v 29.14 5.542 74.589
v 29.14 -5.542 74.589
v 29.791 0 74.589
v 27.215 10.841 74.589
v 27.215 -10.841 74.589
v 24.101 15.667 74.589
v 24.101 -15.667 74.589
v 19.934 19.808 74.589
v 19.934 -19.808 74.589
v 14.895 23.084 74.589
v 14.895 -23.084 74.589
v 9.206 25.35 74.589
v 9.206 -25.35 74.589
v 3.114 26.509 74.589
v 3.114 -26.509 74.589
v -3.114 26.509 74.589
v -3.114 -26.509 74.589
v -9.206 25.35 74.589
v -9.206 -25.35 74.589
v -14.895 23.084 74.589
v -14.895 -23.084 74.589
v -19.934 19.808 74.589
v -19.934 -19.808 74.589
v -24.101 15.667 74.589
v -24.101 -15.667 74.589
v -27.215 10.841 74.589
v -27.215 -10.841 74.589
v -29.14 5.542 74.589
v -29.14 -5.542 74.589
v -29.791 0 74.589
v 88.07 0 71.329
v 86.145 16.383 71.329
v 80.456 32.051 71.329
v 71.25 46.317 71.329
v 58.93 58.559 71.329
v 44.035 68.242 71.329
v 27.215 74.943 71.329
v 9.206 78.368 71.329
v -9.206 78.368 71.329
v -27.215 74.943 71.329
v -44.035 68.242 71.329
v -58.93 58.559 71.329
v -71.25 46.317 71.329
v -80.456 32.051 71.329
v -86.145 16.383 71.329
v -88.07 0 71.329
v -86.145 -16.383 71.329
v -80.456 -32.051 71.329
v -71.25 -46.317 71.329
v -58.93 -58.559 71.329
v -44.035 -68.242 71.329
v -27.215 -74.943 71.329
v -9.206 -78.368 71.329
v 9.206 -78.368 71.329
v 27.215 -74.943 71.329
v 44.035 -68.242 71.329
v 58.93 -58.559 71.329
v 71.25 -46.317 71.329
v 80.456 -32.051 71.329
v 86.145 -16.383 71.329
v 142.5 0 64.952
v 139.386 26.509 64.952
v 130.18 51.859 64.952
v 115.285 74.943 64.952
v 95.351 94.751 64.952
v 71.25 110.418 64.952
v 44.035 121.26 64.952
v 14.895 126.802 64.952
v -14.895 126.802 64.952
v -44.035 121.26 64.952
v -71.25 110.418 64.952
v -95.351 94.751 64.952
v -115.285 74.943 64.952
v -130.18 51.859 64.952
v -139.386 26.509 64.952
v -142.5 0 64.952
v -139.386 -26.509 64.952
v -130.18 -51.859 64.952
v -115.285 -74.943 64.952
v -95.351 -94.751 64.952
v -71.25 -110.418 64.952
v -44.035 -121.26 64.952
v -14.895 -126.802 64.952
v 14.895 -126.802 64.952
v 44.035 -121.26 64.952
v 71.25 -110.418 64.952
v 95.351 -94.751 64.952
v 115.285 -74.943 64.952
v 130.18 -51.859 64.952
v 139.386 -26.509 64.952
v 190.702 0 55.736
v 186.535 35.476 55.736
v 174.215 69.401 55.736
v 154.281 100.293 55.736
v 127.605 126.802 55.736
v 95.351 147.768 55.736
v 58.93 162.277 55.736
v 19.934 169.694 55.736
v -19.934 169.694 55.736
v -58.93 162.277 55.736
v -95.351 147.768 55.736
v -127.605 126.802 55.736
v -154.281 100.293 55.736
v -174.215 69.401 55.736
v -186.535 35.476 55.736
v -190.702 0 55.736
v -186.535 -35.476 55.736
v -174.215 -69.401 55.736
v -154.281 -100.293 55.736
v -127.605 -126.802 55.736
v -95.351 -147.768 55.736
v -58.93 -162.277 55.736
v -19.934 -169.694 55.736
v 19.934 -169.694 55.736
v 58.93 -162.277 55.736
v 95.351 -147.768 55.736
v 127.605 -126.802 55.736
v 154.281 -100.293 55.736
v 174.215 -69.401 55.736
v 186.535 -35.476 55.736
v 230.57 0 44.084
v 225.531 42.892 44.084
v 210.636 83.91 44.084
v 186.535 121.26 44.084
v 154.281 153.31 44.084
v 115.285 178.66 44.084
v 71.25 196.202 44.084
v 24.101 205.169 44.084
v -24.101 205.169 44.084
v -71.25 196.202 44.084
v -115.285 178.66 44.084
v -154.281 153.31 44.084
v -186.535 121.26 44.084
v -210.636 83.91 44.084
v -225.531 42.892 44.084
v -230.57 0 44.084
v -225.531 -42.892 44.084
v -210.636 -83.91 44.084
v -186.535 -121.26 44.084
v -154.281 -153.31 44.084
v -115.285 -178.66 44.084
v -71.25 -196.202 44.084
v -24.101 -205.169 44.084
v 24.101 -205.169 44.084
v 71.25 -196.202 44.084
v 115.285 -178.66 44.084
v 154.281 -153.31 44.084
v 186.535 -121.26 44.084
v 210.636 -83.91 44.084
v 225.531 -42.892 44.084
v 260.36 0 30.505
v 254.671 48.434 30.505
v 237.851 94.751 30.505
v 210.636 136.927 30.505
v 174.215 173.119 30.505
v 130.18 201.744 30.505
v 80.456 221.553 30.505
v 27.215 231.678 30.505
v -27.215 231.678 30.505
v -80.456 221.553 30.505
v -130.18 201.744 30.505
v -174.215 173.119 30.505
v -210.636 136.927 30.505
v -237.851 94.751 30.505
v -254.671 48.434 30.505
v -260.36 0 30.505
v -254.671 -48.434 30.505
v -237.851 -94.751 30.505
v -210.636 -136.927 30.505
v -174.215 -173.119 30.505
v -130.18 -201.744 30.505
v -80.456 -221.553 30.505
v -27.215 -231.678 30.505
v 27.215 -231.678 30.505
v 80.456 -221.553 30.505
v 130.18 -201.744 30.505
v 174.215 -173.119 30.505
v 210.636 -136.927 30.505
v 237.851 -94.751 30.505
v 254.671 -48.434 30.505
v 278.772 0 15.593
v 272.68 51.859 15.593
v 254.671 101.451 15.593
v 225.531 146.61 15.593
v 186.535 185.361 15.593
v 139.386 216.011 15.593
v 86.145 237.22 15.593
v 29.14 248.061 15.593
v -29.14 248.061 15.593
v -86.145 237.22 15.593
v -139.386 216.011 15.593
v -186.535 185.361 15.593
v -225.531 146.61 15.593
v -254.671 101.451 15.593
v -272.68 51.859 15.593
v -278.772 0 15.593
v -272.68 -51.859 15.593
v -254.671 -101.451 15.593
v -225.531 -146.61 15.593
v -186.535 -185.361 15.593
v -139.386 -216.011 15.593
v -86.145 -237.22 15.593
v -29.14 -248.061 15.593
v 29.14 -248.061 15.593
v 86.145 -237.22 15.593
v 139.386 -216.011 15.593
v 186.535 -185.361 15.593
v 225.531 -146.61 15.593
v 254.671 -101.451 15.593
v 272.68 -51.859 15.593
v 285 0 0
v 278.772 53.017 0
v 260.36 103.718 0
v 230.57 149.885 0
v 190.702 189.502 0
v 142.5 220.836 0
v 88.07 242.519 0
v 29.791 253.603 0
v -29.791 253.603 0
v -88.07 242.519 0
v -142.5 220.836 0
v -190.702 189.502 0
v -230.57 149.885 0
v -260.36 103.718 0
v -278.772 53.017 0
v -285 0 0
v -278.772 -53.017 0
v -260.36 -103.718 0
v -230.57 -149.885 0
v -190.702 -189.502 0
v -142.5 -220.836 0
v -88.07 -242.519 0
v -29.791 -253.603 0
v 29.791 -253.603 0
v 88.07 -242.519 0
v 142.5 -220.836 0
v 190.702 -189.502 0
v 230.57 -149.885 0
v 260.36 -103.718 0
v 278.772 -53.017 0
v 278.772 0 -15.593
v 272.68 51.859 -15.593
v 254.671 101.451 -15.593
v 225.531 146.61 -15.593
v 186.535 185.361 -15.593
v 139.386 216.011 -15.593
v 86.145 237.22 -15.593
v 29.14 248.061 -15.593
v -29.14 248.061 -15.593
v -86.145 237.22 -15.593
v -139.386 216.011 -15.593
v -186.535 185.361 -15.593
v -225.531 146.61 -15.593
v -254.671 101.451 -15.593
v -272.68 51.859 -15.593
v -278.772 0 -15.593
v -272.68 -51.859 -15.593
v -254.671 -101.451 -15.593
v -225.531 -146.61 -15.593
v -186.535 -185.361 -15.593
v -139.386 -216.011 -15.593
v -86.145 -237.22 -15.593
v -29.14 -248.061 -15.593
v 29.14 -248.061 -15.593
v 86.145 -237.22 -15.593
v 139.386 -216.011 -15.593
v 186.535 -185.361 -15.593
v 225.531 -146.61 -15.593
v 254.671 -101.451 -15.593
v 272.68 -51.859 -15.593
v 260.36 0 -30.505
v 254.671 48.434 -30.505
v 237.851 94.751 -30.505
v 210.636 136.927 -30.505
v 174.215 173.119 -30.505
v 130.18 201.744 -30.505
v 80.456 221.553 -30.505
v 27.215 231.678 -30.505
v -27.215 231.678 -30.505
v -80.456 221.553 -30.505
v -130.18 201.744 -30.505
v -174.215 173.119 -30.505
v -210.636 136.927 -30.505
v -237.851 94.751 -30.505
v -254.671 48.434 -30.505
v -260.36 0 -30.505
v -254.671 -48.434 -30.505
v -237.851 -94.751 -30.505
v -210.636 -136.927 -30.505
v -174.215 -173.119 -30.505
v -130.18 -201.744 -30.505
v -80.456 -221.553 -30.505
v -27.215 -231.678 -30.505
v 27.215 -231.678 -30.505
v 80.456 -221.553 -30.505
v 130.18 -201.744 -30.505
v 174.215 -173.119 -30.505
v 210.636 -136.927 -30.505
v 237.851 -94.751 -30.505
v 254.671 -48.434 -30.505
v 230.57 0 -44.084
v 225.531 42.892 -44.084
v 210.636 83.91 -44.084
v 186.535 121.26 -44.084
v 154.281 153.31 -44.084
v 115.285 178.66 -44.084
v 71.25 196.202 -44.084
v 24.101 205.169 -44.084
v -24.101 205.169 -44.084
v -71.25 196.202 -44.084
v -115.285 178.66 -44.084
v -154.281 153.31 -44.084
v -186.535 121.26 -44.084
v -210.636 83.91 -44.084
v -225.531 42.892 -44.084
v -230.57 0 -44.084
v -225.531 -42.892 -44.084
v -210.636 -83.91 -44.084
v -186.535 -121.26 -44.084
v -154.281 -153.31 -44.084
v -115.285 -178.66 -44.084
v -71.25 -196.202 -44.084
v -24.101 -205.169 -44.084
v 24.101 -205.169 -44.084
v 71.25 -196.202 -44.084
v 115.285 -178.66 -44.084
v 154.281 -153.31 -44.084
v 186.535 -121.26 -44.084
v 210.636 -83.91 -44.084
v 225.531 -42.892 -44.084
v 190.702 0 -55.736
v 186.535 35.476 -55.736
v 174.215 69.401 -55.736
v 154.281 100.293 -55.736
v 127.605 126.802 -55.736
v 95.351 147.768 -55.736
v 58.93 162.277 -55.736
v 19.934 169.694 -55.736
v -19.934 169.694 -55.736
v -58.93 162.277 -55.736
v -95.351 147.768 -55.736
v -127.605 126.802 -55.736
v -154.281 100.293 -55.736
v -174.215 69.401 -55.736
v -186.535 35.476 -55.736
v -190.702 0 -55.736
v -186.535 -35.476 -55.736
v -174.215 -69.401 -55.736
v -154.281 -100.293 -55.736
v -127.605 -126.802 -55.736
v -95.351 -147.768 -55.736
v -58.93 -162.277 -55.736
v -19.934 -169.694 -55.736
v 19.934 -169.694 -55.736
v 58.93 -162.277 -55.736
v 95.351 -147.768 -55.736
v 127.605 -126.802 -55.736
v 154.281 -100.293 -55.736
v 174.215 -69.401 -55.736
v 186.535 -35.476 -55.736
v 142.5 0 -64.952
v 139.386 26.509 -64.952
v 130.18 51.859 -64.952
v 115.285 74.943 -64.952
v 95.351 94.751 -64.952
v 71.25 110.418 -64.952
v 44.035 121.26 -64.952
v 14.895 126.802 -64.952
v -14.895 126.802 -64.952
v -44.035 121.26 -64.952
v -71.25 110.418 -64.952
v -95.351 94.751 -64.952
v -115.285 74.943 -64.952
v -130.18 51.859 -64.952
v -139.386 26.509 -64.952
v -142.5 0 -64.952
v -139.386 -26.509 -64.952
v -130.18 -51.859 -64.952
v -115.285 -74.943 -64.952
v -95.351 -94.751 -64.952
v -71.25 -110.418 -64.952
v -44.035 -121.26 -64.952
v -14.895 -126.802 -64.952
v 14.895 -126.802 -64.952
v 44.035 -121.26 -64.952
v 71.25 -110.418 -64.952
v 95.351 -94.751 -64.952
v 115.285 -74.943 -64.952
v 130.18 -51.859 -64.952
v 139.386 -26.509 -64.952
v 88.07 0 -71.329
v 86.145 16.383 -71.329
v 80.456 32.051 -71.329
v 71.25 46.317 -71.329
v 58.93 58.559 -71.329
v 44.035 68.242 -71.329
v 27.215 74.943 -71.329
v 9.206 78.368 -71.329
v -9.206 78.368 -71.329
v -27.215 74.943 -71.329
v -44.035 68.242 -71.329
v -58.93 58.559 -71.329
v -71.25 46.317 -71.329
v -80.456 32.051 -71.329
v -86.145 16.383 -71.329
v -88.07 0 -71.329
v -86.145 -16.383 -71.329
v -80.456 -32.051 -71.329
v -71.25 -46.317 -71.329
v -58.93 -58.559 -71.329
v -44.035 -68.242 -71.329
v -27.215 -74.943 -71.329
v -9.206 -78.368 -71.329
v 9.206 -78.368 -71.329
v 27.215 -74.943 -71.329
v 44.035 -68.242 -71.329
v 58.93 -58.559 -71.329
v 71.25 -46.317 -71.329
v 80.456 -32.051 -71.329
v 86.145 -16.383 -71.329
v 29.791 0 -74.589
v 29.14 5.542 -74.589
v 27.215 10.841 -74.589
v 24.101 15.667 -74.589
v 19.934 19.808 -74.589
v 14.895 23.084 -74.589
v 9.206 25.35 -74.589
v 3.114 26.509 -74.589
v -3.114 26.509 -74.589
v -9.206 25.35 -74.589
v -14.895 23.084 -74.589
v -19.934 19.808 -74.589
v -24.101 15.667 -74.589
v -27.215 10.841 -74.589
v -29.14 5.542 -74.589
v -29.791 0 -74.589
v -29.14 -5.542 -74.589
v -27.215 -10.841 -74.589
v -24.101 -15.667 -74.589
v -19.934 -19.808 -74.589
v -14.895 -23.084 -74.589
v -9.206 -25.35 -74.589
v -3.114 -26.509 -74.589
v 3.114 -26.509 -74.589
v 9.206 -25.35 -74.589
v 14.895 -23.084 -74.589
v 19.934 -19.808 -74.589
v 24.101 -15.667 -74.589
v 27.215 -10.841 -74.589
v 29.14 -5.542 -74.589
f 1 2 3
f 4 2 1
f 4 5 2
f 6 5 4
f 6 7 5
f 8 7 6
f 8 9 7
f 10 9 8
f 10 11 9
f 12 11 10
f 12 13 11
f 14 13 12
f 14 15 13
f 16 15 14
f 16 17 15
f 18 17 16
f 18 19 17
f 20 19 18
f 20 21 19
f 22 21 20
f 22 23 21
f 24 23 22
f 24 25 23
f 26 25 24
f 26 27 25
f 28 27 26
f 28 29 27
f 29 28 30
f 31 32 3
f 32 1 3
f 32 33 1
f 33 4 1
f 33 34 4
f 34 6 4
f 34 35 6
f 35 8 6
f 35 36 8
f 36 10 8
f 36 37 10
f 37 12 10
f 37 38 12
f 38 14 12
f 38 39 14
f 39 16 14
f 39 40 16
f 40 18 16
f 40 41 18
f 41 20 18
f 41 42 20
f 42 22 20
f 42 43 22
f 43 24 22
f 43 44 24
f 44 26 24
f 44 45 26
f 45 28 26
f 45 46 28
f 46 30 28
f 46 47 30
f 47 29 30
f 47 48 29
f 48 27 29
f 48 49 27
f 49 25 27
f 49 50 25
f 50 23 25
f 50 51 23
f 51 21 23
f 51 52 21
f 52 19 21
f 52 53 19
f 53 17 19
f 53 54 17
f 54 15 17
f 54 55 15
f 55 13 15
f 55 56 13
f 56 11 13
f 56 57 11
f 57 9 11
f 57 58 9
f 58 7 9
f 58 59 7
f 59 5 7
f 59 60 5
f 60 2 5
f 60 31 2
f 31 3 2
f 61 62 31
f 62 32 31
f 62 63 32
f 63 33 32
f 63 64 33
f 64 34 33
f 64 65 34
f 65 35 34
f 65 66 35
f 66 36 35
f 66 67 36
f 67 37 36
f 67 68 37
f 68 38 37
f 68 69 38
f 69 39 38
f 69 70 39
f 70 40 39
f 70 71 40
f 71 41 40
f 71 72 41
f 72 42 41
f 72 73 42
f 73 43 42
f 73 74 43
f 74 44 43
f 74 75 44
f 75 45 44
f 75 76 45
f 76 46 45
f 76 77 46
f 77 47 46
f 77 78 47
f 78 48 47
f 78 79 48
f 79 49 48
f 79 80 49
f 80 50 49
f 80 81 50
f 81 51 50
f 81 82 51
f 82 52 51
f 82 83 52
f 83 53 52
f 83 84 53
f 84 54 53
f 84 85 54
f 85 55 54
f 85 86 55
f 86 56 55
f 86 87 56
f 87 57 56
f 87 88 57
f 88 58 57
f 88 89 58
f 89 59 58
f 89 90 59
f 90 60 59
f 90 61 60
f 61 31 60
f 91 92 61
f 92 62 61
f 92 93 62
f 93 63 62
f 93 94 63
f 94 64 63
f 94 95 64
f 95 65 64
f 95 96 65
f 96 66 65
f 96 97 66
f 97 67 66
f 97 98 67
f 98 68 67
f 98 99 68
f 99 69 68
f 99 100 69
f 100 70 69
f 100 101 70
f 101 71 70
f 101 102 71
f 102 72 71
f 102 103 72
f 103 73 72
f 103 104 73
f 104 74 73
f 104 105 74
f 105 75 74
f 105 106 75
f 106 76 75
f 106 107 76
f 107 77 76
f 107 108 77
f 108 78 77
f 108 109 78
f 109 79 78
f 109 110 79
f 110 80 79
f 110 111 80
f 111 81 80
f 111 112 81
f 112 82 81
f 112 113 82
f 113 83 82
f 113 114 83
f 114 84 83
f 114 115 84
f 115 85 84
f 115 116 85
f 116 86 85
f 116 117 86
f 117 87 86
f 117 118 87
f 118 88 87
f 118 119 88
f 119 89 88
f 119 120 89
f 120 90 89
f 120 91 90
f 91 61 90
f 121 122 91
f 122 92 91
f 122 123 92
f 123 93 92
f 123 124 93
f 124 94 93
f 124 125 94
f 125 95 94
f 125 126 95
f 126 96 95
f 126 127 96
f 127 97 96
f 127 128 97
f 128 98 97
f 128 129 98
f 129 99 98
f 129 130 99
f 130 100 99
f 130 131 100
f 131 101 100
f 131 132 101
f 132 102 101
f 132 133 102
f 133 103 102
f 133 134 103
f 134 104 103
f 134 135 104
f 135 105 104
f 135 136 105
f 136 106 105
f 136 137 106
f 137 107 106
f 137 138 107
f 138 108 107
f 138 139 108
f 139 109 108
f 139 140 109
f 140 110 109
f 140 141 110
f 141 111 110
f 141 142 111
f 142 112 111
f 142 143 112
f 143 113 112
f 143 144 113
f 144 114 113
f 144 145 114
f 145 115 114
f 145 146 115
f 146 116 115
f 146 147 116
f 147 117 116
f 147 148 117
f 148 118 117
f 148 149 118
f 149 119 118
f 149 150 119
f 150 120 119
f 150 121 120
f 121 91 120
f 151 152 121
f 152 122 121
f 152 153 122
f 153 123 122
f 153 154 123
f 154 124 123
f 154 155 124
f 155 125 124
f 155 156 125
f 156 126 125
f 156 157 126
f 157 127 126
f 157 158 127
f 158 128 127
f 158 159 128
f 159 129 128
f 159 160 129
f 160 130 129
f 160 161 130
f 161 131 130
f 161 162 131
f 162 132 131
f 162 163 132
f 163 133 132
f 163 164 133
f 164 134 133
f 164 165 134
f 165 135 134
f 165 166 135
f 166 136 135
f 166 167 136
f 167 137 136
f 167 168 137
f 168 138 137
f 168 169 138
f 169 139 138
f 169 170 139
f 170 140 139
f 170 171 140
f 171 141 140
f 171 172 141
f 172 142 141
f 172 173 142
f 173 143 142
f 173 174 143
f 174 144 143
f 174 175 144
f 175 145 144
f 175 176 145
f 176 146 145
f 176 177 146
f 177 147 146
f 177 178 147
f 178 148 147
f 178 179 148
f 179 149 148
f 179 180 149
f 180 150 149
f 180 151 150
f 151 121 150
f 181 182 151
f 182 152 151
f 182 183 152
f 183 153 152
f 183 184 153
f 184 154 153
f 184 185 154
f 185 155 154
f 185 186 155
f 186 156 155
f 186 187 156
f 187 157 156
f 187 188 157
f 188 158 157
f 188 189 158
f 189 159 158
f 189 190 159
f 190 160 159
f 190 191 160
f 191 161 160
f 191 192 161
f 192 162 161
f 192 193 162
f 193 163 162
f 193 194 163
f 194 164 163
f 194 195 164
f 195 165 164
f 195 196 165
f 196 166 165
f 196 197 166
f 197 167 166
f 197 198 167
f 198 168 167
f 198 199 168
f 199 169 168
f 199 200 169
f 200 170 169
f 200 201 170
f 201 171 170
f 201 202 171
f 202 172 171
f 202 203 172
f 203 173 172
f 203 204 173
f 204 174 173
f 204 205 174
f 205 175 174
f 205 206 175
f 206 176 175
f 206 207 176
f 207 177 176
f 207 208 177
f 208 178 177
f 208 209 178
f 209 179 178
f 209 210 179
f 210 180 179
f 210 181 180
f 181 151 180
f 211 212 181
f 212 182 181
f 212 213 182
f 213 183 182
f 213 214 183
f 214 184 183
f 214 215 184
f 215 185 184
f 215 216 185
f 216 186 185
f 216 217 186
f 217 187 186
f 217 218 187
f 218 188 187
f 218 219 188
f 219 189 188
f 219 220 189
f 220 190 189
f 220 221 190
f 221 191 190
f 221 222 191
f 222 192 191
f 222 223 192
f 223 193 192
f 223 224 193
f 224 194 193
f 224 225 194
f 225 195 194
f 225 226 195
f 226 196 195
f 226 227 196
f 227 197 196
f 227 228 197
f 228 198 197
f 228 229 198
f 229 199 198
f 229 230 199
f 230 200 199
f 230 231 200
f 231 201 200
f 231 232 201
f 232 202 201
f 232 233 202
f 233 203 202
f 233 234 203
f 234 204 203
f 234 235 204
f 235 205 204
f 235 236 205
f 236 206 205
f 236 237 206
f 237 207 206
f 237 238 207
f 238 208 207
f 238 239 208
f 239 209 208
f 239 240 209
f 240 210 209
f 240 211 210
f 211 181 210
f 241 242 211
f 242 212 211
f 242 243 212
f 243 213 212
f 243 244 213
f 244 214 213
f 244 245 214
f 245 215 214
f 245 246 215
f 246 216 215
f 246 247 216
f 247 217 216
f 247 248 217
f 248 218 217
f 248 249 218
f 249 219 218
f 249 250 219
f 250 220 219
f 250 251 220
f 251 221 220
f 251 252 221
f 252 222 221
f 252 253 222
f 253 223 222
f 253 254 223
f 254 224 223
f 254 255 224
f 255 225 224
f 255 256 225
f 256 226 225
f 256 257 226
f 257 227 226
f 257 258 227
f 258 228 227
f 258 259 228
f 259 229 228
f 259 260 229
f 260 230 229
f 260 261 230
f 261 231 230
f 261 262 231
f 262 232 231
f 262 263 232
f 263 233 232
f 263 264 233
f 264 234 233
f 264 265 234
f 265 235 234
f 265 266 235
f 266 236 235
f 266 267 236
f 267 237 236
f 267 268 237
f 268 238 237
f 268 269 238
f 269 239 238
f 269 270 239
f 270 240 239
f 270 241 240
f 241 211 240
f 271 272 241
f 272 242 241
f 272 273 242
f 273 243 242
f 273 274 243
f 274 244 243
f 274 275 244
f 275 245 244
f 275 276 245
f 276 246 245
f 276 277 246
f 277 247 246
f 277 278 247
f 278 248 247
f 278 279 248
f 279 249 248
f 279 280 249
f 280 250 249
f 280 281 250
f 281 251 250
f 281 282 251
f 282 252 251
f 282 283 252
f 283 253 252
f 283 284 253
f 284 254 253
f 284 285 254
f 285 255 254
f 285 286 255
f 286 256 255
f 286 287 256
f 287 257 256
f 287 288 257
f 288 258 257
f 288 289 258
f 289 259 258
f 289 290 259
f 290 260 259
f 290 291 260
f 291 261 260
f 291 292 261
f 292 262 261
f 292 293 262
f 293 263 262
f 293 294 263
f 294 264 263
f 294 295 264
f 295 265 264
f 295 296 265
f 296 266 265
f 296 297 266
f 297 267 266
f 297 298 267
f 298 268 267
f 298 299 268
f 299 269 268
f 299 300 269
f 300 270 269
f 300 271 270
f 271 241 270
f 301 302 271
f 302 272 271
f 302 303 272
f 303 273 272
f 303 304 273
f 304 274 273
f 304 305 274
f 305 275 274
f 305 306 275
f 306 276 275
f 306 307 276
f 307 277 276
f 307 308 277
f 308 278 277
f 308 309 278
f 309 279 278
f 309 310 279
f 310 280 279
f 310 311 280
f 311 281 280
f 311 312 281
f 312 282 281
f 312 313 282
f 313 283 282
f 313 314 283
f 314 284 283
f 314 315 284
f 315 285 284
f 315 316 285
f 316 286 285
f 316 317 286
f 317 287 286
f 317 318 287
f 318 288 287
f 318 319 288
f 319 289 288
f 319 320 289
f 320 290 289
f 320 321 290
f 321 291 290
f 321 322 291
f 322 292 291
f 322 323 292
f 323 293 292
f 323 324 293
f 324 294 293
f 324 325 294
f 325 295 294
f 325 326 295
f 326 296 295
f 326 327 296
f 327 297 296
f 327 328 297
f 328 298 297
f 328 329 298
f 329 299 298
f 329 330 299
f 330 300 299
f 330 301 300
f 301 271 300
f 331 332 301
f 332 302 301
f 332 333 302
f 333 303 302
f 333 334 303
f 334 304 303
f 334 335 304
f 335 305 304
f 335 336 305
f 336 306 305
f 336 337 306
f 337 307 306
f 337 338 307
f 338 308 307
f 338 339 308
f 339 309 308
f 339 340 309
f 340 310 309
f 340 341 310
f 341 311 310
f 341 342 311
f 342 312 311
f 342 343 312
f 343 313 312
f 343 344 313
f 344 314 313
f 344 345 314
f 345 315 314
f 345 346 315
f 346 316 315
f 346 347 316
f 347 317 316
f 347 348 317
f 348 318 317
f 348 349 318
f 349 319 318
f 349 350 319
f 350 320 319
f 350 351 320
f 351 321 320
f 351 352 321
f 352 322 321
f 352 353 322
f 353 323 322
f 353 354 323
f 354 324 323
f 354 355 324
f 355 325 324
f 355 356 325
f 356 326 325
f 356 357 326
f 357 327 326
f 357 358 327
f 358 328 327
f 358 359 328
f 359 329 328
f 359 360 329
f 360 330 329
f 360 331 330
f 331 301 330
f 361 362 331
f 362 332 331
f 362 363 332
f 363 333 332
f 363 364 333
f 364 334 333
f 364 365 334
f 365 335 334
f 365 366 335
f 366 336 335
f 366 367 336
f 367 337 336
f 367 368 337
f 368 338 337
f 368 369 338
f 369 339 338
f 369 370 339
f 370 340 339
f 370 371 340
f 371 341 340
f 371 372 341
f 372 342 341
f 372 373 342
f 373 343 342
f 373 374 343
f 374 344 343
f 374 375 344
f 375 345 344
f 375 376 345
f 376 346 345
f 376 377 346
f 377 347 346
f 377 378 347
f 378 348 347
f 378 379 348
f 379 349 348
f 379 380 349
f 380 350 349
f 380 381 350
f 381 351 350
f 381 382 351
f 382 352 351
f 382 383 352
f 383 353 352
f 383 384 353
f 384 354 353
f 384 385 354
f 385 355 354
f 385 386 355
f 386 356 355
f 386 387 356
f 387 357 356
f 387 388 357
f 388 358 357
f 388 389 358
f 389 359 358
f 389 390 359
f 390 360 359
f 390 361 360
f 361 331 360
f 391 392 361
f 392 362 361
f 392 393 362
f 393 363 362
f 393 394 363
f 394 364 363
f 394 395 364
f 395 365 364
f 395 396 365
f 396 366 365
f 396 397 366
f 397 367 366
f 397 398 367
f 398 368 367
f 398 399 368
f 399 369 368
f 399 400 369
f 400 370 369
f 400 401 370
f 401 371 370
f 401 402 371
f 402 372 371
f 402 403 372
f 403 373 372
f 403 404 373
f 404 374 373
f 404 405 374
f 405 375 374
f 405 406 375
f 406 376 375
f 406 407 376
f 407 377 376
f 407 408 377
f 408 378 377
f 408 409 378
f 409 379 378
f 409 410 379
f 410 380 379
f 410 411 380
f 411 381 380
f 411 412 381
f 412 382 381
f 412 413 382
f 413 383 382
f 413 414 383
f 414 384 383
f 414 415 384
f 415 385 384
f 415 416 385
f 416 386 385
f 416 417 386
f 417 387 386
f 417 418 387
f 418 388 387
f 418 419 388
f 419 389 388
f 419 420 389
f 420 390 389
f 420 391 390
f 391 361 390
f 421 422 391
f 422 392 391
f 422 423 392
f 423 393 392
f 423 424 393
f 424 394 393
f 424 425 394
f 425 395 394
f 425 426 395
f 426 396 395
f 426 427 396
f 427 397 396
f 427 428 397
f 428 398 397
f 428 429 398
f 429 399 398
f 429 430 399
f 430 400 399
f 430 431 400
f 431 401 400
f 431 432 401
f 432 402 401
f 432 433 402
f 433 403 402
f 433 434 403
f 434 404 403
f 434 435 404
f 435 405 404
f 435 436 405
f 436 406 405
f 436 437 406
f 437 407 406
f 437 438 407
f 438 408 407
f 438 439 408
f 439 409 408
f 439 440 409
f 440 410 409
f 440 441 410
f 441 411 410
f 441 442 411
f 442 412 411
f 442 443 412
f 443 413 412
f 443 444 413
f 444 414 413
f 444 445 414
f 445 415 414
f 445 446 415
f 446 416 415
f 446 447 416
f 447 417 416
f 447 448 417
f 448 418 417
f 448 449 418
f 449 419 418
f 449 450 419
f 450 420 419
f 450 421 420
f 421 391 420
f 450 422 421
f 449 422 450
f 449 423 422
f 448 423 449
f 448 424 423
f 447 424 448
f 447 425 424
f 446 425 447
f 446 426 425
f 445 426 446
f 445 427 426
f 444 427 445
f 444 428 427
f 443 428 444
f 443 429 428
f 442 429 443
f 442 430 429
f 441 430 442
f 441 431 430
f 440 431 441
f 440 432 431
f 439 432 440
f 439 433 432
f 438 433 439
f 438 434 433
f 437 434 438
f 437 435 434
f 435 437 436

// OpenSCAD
// Generated by SolidPython 1.0.1 on 2020-07-29 00:46:54


scale(v = [19, 17, 5]) {
	sphere(r = 15);
}
/***********************************************
*********      SolidPython code:      **********
************************************************
 
# import packages: SolidPython
from solid import *
from solid.utils import *
from itertools import chain, combinations, permutations


class Resize:

    def __init__(self, scad_file):
        self.scad_file = scad_file
        #self.scad_file = import_scad(scad_file)
        # cone/cylinder param:
        self.r1 = 0
        self.r2 = 0
        self.h = 0
        # rectangular prism param:
        self.w = 0
        self.l = 0
        # ellipse param:
        self.r = 0

    # import OpenScad code (file name corresponds to shape)


    # classify shape + parameters
    def assign(self, param1, param2, param3):
        if self.scad_file == 'cone.scad':
            self.r1 = param1
            self.r2 = param2
            self.h = param3
        elif self.scad_file == 'cylinder.scad':
            self.r1 = param1
            self.r2 = param2
            self.h = param3
        elif self.scad_file == 'rectangularPrism.scad':
            self.h = param1
            self.l = param2
            self.w = param3
        else:
            self.r = param1
            self.h = param2

    # resize parameters
    def iterate(self):
        x = range(3, 20, 2)
        i = 1
        if self.scad_file == 'cone.scad':
            tempList = list(permutations(x, 2))
            for temp in tempList:
                param1 = temp[0]
                param2 = temp[1]
                filepath = 'produced_scad_files/' + 'cone' + str(param1) + '_' + str(param2) + '_' + '.scad'
                scad_render_to_file(cylinder(h=param1, r1=param2, r2=0), filepath)

        elif self.scad_file == 'cylinder.scad':
            tempList = list(permutations(x, 3))
            for temp in tempList:
                param1 = temp[0]
                param2 = temp[1]
                filepath = 'produced_scad_files/' + 'cylinder' + str(param1) + '_' + str(param2) + '_' + '.scad'
                scad_render_to_file(cylinder(h=param1, r1=param2, r2=param2), filepath)

        elif self.scad_file == 'rectangularPrism.scad':
            tempList = list(permutations(x, 3))
            for temp in tempList:
                param1 = temp[0]
                param2 = temp[1]
                param3 = temp[2]
                filepath = 'produced_scad_files/' + 'rectangularPrism' + str(param1) + '_' + str(param2) + '_' + str(
                    param3) + '.scad'
                scad_render_to_file(cube(size=(param1, param2, param3)), filepath)

        elif self.scad_file == 'ellipse.scad':
            tempList = list(permutations(x, 4))
            for temp in tempList:
                param1 = temp[0]
                param2 = temp[1]
                param3 = temp[2]
                param4 = temp[3]
                filepath = 'produced_scad_files/' + 'ellipse' + str(param1) + '_' + str(param2) + '_' + str(param3) + '_' + str(param4) + '.scad'
                scad_render_to_file(scale([param1, param2, param3])(sphere(r=param4)), filepath)

    def render_to_scadfile(self):
        scad_render_to_file(scad, 'example.scad') 
 
************************************************/
